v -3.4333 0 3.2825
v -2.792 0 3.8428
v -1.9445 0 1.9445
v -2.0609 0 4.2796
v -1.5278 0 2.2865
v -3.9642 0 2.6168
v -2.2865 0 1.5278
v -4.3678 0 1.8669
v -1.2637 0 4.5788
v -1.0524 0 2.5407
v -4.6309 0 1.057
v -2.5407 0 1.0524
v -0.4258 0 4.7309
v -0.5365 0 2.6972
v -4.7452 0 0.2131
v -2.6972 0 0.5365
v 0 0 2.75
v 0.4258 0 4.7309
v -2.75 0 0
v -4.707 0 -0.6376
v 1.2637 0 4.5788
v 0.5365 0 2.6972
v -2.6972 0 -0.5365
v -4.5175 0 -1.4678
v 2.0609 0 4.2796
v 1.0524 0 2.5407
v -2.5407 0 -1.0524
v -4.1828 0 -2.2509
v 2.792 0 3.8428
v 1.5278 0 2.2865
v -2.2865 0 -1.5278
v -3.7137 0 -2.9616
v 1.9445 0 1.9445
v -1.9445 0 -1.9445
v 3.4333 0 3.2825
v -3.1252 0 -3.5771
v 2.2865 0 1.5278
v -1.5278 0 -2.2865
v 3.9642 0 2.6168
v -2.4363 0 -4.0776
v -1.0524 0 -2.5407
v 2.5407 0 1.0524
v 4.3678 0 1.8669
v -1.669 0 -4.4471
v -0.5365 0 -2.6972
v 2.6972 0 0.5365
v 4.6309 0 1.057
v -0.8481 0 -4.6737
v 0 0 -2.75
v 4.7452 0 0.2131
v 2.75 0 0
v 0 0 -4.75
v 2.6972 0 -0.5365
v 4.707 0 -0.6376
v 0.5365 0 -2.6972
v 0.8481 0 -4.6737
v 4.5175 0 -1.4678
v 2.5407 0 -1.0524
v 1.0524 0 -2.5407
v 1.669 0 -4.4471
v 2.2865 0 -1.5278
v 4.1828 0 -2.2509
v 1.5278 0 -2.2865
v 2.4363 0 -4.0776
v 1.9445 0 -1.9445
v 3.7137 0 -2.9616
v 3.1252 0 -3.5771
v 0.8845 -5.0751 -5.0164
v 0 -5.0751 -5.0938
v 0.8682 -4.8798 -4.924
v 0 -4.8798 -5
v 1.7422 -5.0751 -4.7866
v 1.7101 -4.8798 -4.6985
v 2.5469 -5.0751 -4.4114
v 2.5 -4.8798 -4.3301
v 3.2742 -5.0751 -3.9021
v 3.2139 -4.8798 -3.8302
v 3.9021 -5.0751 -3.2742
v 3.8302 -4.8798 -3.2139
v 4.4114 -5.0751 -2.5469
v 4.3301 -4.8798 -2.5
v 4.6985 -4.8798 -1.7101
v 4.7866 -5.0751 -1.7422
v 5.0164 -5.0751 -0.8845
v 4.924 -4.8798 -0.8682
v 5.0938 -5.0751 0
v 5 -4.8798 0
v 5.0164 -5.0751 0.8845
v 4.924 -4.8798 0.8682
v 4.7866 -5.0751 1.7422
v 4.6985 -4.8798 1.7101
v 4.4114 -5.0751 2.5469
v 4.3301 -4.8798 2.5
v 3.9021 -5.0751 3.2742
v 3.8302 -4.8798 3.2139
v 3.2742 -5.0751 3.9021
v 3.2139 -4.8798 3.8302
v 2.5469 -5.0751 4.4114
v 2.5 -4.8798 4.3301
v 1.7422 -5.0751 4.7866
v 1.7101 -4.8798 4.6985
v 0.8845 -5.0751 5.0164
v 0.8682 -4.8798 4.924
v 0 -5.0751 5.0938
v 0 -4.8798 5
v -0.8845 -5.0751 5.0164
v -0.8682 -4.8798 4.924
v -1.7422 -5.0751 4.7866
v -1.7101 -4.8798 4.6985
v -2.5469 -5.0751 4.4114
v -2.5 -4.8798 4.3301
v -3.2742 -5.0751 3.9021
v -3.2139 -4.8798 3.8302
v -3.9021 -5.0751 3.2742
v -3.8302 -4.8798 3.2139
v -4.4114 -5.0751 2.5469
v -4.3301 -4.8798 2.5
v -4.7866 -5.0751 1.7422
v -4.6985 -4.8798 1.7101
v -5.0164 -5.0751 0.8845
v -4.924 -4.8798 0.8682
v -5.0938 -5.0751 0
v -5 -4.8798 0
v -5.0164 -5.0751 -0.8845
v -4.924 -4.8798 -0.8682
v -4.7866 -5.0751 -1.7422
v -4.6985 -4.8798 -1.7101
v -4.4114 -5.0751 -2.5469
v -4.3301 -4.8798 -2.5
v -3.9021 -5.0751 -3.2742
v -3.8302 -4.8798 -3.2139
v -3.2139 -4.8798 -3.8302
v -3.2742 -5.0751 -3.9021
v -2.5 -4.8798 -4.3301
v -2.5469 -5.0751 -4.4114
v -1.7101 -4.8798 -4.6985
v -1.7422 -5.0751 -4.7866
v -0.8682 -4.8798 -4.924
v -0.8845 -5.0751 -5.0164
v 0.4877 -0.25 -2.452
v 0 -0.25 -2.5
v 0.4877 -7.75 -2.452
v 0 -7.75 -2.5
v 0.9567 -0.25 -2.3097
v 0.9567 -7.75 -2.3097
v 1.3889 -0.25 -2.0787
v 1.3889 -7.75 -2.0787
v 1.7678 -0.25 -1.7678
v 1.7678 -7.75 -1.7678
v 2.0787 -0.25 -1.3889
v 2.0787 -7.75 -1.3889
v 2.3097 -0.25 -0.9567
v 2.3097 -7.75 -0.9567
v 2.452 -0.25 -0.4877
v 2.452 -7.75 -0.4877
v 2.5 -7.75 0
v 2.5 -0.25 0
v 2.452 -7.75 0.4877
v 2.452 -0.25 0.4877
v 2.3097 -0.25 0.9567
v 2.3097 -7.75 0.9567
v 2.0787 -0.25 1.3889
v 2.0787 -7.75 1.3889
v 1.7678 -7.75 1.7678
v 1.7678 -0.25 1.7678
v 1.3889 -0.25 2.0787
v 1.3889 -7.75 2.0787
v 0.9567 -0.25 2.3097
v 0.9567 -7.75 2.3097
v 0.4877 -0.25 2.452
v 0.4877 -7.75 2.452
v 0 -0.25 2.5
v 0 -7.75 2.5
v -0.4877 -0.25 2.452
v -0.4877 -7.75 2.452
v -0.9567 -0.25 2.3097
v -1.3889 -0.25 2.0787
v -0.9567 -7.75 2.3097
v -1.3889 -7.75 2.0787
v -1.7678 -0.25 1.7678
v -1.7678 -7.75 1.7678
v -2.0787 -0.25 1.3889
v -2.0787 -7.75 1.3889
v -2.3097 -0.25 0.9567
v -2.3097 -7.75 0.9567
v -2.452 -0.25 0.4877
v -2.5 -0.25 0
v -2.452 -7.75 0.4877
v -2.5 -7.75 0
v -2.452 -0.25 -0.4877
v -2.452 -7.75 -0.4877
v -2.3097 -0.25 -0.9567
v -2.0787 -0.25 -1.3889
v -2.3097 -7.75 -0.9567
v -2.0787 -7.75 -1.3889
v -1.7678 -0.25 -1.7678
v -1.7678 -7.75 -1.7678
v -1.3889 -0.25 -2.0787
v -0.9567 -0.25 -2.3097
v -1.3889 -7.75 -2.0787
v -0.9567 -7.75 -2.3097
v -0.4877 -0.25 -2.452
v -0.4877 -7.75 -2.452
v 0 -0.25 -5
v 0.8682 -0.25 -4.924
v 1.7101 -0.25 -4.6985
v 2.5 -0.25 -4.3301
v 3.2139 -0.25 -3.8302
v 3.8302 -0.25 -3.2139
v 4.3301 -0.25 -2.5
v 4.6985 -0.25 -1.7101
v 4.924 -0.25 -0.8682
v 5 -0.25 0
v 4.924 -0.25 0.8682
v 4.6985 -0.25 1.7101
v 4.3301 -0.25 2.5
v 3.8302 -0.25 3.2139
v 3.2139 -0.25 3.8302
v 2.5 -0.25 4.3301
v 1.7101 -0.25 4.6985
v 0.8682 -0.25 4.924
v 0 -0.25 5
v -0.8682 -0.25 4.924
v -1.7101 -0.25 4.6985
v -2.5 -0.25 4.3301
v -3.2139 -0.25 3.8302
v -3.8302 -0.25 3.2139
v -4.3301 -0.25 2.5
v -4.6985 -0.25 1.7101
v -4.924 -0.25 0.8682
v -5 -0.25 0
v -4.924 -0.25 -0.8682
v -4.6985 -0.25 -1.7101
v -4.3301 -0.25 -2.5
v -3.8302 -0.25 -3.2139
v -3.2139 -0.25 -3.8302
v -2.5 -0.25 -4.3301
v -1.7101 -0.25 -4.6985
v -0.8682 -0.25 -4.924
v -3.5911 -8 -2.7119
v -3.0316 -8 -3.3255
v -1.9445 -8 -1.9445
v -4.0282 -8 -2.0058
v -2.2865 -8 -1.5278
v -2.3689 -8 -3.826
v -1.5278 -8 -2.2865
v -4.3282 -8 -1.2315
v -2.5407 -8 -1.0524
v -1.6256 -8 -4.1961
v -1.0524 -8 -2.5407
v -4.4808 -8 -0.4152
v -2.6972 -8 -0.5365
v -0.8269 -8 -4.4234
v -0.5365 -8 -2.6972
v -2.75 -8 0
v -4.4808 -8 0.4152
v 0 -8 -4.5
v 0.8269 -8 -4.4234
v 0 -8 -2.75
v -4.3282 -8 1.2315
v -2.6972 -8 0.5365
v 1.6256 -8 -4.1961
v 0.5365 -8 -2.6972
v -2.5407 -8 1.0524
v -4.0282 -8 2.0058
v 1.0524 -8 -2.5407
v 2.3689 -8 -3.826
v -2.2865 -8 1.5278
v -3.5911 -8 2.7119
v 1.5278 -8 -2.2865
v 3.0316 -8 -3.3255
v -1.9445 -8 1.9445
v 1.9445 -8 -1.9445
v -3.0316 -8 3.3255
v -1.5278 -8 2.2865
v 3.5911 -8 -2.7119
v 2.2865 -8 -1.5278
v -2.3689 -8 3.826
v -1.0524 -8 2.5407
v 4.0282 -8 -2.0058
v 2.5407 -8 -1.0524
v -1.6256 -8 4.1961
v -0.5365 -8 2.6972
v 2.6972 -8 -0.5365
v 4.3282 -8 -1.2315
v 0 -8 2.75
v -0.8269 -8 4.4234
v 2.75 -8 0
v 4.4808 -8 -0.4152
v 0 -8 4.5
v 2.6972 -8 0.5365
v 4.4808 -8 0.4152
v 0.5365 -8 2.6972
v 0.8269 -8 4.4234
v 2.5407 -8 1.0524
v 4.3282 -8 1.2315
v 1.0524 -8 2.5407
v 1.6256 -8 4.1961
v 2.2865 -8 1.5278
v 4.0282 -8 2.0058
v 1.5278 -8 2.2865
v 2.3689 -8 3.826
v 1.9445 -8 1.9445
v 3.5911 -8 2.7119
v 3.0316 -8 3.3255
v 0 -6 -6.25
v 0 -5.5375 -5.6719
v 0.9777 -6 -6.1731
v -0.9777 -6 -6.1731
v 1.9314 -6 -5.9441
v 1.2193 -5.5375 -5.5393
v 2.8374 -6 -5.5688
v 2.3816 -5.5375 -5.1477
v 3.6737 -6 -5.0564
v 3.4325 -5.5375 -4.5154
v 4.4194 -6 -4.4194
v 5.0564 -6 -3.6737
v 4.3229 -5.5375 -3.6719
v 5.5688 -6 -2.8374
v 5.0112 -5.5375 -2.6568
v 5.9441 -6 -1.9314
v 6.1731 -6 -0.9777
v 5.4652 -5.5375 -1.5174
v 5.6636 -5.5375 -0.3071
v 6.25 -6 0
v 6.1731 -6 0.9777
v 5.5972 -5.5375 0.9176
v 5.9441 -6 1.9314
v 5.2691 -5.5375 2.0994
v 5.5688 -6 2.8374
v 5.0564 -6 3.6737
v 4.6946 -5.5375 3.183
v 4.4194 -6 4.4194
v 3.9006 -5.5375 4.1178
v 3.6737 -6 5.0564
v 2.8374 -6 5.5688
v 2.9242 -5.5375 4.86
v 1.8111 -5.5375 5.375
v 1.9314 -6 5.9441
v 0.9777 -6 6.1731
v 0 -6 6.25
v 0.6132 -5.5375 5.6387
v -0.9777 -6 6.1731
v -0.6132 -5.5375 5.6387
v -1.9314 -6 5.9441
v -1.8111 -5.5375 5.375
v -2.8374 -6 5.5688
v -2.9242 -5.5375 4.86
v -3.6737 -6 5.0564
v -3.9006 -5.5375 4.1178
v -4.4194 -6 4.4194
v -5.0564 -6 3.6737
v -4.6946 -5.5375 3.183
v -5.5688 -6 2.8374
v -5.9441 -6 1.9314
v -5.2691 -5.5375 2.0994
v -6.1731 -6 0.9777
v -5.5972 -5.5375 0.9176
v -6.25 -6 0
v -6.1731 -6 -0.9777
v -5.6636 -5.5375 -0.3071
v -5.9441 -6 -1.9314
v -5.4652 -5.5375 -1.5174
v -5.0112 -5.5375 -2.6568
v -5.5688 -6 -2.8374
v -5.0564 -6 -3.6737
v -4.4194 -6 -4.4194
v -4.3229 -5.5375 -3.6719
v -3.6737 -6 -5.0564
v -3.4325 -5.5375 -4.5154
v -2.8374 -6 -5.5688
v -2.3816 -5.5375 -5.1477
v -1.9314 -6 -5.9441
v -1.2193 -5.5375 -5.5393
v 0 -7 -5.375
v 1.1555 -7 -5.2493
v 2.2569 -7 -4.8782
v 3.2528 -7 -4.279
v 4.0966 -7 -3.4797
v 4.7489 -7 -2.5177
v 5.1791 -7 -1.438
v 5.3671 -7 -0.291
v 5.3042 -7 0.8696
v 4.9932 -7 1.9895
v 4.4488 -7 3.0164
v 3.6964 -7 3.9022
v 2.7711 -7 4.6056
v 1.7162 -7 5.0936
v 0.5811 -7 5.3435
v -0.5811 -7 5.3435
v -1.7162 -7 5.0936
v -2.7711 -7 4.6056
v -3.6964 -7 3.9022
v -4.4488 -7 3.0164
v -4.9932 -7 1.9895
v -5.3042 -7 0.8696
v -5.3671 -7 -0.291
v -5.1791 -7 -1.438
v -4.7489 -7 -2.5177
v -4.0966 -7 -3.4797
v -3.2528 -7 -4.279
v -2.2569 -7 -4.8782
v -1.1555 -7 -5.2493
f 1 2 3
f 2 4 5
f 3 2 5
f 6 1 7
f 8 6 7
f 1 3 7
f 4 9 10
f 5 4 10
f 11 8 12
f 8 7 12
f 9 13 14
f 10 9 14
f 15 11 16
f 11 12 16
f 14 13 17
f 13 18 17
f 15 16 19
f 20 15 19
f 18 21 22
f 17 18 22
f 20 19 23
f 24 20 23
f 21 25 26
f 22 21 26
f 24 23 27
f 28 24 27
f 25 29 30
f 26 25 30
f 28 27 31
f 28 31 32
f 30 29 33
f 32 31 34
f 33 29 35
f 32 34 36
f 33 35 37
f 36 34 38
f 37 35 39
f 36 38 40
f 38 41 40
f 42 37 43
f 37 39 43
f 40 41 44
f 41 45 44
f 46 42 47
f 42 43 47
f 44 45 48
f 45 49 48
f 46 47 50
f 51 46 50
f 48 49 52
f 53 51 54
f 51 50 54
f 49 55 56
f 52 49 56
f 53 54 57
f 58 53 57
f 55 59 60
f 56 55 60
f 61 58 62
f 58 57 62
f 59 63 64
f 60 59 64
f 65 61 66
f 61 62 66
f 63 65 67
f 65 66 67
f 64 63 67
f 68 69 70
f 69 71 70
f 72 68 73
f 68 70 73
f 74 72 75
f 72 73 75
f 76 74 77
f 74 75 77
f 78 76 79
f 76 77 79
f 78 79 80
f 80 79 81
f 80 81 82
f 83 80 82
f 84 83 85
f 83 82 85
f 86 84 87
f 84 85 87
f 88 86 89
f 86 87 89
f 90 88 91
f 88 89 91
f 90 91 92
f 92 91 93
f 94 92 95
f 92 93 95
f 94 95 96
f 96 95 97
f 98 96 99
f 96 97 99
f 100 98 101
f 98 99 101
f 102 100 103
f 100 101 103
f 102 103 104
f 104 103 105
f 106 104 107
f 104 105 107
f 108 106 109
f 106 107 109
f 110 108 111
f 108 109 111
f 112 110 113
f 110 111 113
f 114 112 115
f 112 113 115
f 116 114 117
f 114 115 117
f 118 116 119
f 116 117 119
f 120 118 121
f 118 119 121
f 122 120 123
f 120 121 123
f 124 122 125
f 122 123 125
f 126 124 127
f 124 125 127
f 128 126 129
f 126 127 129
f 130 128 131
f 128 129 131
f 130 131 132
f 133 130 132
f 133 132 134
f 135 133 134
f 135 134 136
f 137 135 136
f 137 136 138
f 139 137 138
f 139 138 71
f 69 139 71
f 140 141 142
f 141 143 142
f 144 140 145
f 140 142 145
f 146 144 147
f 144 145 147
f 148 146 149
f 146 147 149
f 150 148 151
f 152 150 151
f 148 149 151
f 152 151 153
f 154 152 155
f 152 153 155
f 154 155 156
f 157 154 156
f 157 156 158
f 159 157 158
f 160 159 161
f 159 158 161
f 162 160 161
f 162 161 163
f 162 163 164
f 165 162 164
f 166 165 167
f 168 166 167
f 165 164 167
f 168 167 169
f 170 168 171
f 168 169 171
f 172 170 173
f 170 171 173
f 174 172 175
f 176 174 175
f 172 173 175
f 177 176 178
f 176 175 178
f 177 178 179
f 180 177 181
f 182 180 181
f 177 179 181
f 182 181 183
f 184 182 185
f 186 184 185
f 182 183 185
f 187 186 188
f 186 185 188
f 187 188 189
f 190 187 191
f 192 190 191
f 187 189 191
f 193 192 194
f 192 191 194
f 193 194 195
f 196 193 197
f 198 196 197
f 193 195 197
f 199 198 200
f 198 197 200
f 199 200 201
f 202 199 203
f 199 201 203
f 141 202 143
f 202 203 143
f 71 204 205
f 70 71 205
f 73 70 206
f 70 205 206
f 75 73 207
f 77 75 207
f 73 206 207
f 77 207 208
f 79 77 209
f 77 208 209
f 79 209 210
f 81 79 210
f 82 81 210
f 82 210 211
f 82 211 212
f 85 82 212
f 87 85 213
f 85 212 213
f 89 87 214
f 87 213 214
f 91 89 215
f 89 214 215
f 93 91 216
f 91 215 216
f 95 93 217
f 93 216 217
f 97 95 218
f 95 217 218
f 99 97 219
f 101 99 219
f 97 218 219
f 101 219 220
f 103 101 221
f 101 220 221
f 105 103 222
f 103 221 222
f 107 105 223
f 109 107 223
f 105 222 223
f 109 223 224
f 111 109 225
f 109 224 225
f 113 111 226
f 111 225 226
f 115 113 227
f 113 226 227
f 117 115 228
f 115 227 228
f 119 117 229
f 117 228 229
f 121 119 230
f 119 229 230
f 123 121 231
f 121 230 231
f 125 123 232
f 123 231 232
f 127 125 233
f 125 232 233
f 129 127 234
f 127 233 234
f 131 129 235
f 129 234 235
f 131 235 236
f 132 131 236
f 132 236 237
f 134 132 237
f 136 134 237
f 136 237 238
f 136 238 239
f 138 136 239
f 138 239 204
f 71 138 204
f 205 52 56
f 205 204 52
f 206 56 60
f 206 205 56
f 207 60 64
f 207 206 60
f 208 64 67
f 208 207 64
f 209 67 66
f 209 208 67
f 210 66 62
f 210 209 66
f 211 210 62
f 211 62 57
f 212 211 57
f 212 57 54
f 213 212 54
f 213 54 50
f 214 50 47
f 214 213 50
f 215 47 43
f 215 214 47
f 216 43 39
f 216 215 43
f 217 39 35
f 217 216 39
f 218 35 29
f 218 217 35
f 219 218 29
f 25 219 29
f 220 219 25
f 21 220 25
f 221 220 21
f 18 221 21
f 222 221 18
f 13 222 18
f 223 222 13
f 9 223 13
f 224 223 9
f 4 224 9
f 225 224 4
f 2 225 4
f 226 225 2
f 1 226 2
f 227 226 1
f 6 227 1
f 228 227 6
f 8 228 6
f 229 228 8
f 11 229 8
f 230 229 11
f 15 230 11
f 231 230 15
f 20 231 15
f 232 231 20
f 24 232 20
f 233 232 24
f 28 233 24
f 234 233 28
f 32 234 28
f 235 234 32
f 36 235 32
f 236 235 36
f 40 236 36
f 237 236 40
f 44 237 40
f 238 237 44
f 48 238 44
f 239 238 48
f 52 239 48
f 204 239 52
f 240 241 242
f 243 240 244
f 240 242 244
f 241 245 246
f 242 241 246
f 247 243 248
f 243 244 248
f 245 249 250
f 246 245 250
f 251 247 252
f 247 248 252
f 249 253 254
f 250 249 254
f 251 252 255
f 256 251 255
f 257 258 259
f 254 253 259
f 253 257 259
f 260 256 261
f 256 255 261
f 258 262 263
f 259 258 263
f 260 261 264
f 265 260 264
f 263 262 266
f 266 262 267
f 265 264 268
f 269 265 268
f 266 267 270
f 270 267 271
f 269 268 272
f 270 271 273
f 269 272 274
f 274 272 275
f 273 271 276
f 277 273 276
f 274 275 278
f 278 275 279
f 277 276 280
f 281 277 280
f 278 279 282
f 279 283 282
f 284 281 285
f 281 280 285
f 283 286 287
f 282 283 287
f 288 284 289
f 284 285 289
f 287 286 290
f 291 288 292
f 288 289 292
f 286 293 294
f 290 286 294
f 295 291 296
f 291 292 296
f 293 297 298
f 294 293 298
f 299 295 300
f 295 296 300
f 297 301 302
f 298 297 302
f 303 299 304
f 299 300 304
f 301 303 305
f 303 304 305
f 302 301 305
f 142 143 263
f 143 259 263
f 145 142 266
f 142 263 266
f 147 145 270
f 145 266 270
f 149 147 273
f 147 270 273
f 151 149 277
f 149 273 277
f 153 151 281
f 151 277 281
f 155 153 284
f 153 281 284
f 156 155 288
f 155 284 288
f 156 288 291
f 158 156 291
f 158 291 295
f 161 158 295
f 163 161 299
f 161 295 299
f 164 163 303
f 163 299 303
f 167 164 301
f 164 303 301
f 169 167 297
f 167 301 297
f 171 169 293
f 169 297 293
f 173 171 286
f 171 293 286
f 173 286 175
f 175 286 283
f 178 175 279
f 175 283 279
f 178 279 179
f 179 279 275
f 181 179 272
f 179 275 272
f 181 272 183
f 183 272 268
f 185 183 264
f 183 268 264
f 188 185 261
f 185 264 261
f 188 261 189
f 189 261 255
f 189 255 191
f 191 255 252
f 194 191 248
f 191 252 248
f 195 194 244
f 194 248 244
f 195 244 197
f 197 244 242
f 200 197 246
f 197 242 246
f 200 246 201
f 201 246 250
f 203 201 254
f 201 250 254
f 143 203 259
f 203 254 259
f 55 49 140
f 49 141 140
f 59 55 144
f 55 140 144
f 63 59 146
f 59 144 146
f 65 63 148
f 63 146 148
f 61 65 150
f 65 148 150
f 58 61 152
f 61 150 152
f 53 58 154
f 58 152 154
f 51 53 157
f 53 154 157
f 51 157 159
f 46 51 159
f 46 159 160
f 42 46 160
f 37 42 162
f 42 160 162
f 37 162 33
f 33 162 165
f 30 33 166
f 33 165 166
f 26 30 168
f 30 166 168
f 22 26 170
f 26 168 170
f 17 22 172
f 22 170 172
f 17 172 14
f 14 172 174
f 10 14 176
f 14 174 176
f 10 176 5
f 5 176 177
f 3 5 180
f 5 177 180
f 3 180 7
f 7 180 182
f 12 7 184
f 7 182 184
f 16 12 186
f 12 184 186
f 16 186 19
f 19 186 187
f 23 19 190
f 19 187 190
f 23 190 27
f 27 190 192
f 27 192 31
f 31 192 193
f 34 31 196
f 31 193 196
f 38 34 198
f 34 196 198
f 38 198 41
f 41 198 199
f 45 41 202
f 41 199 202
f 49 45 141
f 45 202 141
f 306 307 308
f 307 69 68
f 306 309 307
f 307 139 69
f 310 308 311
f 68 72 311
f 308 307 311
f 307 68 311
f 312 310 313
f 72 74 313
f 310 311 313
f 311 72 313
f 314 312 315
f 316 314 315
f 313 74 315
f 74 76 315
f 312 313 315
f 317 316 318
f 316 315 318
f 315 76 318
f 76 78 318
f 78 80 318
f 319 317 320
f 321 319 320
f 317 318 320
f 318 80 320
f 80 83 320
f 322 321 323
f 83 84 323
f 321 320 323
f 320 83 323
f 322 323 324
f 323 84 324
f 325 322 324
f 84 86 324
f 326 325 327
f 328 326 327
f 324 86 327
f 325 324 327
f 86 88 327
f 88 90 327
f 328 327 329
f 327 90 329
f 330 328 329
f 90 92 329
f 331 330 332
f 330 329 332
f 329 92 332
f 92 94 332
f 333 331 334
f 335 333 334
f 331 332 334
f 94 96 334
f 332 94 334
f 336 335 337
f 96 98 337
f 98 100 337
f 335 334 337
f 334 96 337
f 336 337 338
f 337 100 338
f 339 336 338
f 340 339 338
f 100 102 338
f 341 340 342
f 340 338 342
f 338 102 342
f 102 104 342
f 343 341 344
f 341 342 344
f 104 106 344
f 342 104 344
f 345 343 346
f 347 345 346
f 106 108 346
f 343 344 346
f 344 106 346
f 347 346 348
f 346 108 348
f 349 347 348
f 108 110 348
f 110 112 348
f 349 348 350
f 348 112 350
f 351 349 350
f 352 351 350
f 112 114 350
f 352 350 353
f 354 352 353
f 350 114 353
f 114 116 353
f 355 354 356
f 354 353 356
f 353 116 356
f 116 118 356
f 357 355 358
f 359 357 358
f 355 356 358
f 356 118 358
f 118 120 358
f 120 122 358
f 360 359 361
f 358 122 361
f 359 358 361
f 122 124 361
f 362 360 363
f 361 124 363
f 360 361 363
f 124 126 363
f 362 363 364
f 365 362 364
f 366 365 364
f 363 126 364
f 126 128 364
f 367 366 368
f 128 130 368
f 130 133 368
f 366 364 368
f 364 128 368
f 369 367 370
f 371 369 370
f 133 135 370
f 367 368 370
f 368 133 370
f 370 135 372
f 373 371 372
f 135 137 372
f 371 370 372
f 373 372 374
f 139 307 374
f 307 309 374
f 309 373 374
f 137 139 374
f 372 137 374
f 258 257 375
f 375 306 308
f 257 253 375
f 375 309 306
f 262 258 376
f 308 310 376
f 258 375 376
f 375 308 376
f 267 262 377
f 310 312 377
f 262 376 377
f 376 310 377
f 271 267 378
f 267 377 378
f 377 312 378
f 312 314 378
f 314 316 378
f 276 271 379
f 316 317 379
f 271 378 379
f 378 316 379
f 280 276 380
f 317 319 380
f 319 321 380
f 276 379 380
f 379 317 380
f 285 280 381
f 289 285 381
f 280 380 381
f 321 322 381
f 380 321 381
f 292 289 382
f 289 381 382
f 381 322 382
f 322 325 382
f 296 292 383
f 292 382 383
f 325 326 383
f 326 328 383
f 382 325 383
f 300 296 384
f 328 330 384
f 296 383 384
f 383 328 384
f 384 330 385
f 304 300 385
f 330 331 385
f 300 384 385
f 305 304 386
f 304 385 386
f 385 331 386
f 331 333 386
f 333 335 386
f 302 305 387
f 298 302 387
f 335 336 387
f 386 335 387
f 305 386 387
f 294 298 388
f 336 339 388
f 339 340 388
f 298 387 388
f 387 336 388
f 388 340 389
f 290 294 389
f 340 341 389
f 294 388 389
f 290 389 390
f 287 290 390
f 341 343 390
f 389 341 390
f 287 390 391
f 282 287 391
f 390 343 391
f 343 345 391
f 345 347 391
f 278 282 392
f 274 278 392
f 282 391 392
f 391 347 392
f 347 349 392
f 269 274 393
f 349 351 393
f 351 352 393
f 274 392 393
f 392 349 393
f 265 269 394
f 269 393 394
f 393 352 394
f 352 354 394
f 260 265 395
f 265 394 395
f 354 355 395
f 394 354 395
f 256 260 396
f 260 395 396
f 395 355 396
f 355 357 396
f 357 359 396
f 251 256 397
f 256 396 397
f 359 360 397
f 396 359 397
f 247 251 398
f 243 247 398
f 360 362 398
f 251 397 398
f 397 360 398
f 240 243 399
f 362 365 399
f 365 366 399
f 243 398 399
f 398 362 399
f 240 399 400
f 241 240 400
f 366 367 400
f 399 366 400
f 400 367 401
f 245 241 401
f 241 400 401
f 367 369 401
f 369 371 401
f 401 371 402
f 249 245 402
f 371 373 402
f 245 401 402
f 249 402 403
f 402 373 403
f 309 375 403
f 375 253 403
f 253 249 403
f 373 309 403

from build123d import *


# Not quite as in the source:
# - a fillet or chamfer that OpenCascade refuses, or shapes differently, is made with other operations: its cross-section is extruded or revolved along the edge and cut away or added


with BuildPart() as f1:
    # F0 (on Right) → F1 (revolve)
    with BuildSketch(Plane.YZ):
        Polygon((0, -5), (0, -2.5), (-8, -2.5), (-8, -4.5), (-6, -6.25), (-5, -5), align=None)
    revolve(axis=Axis((0, -4, 0), (0, -1, 0)))

    # F2: chamfer of 0.25 on 4 edges, made by hand

    # F2_s1 → F2_t2 (revolve)
    with BuildSketch(Plane.YZ):
        Polygon((-5.0750609905, -5.0938262381), (-4.8798437881, -5), (-5, -5), align=None)
    revolve(axis=Axis((0, -5, 0), (0, -1, 0)))

    # F2_s3 → F2_t4 (revolve, cut)
    with BuildSketch(Plane.YZ):
        Polygon((-7.75, -2.5), (-8, -2.75), (-8, -2.5), align=None)
    revolve(axis=Axis((0, -8, 0), (0, -1, 0)), mode=Mode.SUBTRACT)

    # F2_s5 → F2_t6 (revolve, cut)
    with BuildSketch(Plane.YZ):
        Polygon((0, -2.75), (-0.25, -2.5), (0, -2.5), align=None)
    revolve(axis=Axis((0, 0, 0), (0, -1, 0)), mode=Mode.SUBTRACT)

    # F2_s7 → F2_t8 (revolve, cut)
    with BuildSketch(Plane.YZ):
        Polygon((0, -4.75), (-0.25, -5), (0, -5), align=None)
    revolve(axis=Axis((0, 0, 0), (0, -1, 0)), mode=Mode.SUBTRACT)


solid = f1.part
